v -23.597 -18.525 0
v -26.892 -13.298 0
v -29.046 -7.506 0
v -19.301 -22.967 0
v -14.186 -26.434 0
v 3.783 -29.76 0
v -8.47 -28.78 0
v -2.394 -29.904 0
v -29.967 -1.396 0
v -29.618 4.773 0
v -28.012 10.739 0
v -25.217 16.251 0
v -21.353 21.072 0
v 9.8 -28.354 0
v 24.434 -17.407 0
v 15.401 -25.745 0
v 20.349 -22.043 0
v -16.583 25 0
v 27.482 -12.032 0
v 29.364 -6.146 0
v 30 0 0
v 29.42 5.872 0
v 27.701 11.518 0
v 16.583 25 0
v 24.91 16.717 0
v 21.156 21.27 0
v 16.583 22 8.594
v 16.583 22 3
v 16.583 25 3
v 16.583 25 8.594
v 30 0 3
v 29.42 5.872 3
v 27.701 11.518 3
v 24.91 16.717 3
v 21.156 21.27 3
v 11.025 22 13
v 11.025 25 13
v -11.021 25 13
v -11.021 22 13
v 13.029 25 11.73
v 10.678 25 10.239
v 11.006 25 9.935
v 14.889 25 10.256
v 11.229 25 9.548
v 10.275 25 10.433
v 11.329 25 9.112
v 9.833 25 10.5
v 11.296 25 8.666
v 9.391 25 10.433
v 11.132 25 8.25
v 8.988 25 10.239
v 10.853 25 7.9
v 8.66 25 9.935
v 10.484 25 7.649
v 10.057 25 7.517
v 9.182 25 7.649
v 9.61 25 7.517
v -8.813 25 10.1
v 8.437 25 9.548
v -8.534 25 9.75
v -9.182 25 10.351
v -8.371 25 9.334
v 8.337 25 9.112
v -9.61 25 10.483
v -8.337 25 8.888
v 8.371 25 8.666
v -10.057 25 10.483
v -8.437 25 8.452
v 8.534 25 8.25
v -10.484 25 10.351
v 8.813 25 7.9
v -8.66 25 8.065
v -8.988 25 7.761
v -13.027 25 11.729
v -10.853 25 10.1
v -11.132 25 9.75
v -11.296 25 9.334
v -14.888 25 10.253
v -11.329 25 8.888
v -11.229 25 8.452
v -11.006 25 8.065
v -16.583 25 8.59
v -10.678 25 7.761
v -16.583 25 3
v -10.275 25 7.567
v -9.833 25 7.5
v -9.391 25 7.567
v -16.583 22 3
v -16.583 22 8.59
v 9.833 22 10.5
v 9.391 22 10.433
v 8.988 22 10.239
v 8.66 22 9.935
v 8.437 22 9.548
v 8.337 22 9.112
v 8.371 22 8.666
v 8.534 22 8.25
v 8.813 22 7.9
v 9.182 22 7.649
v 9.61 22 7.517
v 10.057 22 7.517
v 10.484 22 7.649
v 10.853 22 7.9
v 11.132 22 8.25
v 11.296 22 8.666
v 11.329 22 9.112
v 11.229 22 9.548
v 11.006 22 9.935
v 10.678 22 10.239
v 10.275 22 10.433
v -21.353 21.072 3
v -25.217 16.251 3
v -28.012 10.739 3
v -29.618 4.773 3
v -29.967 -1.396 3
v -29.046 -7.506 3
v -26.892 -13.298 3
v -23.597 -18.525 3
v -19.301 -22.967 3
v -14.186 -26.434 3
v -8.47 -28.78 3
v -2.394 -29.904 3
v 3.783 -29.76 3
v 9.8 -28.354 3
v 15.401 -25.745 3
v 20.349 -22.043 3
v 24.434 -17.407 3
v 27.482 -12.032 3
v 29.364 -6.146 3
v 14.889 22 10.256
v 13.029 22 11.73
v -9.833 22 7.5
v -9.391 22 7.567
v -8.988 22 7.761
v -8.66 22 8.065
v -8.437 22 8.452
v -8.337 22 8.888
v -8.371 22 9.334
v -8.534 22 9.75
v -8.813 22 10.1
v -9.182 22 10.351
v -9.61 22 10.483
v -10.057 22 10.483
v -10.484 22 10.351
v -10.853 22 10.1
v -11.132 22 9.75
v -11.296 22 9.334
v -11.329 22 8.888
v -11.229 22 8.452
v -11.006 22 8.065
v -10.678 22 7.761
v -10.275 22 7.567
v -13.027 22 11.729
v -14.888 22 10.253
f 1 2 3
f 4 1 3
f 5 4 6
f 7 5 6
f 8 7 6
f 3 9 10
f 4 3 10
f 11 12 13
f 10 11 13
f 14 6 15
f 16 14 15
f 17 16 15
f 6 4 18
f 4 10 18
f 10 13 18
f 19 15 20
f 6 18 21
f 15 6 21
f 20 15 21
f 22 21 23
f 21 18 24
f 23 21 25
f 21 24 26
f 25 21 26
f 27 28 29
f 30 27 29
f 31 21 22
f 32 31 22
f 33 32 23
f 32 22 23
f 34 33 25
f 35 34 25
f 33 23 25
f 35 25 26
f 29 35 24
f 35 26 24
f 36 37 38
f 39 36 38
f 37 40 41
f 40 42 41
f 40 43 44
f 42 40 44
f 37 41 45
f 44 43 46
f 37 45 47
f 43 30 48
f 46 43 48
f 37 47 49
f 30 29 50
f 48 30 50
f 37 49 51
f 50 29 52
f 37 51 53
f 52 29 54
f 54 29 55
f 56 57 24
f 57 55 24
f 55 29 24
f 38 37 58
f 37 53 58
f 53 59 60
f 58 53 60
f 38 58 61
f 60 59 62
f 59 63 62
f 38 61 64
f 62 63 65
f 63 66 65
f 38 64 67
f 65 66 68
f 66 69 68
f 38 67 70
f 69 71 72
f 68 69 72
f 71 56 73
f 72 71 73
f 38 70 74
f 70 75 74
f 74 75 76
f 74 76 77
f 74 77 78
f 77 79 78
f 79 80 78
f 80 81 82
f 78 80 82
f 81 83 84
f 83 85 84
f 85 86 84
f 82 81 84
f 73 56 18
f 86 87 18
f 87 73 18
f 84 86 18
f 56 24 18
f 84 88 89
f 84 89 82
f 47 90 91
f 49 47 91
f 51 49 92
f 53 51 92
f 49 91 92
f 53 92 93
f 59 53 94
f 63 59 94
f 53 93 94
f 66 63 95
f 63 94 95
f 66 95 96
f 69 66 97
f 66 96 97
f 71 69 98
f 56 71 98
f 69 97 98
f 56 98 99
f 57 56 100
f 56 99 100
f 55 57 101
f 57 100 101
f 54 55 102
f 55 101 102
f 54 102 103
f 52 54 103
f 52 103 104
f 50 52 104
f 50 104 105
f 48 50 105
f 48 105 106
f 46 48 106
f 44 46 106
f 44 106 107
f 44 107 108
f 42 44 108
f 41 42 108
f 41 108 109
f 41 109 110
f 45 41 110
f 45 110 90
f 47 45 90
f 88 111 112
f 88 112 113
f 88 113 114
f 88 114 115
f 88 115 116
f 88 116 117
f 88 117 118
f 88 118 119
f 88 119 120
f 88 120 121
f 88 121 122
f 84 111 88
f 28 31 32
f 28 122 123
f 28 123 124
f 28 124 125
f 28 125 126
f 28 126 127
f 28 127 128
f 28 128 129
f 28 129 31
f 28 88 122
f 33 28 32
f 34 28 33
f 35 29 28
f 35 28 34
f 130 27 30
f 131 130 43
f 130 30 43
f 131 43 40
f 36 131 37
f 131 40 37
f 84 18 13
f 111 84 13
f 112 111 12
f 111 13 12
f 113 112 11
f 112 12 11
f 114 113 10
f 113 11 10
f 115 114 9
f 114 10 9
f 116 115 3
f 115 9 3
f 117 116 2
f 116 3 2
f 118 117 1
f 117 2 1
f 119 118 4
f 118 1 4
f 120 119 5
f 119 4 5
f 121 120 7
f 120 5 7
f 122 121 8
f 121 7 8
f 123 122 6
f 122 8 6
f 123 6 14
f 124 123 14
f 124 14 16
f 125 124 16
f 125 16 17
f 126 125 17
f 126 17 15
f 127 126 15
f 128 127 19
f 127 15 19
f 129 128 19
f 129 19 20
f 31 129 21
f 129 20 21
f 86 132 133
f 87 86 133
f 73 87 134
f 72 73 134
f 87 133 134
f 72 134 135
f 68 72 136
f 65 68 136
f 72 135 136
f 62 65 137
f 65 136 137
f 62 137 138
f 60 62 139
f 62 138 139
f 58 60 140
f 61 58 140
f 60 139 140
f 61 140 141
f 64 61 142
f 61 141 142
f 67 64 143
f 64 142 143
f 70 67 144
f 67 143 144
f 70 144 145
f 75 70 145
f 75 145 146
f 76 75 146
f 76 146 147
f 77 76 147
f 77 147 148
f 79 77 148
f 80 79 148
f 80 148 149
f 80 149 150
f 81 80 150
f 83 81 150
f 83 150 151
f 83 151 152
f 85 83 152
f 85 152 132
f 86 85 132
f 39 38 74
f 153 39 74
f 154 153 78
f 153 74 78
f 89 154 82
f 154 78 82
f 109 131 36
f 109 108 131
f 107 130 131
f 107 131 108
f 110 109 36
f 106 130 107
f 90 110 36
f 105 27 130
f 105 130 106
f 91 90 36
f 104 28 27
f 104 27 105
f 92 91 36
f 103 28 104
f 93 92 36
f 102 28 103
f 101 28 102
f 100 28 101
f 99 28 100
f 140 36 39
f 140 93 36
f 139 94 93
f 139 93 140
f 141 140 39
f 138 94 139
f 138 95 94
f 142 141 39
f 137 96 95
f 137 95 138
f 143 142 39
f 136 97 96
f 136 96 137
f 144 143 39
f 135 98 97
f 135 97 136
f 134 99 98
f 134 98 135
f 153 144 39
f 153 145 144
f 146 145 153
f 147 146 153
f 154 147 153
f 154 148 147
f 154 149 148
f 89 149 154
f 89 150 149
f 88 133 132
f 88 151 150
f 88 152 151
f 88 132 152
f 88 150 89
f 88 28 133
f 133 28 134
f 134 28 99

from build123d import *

# Parameters (mm, degrees)
BOSS_EXTRU_1_DEPTH      = 3
BOSS_EXTRU_2_START      = -3
ESQUISSE2_W             = 33.166247904
ESQUISSE2_H             = 3
BOSS_EXTRU_2_DEPTH      = 10
ENL_V_MAT_EXTRU_1_DEPTH = 64.984373092
ESQUISSE4_R             = 1.5
ENL_V_MAT_EXTRU_2_DEPTH = 62.424750712


with BuildPart() as part:
    # Esquisse1 → Boss.-Extru.1 (new body)
    with BuildSketch(Plane.XY):
        with BuildLine():
            Line((16.583123952, 25), (-16.583123952, 25))
            ThreePointArc((-16.583123952, 25), (-14.186371655, -26.433820369), (30, 0))
            ThreePointArc((30, 0), (26.433820369, 14.186371655), (16.583123952, 25))
        make_face()
    extrude(amount=BOSS_EXTRU_1_DEPTH)

    # Esquisse2 → Boss.-Extru.2 (add)
    with BuildSketch(Plane(origin=(0, 0, 0), x_dir=(-1, 0, 0), z_dir=(0, 0, -1)).offset(BOSS_EXTRU_2_START)):
        with Locations((0, 23.5)):
            Rectangle(ESQUISSE2_W, ESQUISSE2_H)
    extrude(amount=-BOSS_EXTRU_2_DEPTH)

    # Esquisse3 → Enlèv. mat.-Extru.1 (cut, through all)
    with BuildSketch(Plane(origin=(0, 25, 0), x_dir=(1, 0, 0), z_dir=(0, 1, 0))):
        with BuildLine():
            Line((11.024660406, -13), (16.583123952, -13))
            Line((16.583123952, -13), (16.583123952, -8.593951902))
            ThreePointArc((16.583123952, -8.593951902), (13.978605431, -11.017385992), (11.024660406, -13))
        make_face()
        with BuildLine():
            Line((-16.583123952, -8.589860243), (-16.583123952, -13))
            Line((-16.583123952, -13), (-11.02090831, -13))
            ThreePointArc((-11.02090831, -13), (-13.977028503, -11.015661574), (-16.583123952, -8.589860243))
        make_face()
    extrude(amount=-ENL_V_MAT_EXTRU_1_DEPTH, mode=Mode.SUBTRACT)

    # Esquisse4 → Enlèv. mat.-Extru.2 (cut, through all)
    with BuildSketch(Plane.XZ.offset(-22)):
        with Locations(Location((-9.833123952, 9, 0), (0, 0, 270))):
            Circle(ESQUISSE4_R)
        with Locations(Location((9.833123952, 9, 0), (0, 0, 90))):
            Circle(ESQUISSE4_R)
    extrude(amount=-ENL_V_MAT_EXTRU_2_DEPTH, mode=Mode.SUBTRACT)


solid = part.part
